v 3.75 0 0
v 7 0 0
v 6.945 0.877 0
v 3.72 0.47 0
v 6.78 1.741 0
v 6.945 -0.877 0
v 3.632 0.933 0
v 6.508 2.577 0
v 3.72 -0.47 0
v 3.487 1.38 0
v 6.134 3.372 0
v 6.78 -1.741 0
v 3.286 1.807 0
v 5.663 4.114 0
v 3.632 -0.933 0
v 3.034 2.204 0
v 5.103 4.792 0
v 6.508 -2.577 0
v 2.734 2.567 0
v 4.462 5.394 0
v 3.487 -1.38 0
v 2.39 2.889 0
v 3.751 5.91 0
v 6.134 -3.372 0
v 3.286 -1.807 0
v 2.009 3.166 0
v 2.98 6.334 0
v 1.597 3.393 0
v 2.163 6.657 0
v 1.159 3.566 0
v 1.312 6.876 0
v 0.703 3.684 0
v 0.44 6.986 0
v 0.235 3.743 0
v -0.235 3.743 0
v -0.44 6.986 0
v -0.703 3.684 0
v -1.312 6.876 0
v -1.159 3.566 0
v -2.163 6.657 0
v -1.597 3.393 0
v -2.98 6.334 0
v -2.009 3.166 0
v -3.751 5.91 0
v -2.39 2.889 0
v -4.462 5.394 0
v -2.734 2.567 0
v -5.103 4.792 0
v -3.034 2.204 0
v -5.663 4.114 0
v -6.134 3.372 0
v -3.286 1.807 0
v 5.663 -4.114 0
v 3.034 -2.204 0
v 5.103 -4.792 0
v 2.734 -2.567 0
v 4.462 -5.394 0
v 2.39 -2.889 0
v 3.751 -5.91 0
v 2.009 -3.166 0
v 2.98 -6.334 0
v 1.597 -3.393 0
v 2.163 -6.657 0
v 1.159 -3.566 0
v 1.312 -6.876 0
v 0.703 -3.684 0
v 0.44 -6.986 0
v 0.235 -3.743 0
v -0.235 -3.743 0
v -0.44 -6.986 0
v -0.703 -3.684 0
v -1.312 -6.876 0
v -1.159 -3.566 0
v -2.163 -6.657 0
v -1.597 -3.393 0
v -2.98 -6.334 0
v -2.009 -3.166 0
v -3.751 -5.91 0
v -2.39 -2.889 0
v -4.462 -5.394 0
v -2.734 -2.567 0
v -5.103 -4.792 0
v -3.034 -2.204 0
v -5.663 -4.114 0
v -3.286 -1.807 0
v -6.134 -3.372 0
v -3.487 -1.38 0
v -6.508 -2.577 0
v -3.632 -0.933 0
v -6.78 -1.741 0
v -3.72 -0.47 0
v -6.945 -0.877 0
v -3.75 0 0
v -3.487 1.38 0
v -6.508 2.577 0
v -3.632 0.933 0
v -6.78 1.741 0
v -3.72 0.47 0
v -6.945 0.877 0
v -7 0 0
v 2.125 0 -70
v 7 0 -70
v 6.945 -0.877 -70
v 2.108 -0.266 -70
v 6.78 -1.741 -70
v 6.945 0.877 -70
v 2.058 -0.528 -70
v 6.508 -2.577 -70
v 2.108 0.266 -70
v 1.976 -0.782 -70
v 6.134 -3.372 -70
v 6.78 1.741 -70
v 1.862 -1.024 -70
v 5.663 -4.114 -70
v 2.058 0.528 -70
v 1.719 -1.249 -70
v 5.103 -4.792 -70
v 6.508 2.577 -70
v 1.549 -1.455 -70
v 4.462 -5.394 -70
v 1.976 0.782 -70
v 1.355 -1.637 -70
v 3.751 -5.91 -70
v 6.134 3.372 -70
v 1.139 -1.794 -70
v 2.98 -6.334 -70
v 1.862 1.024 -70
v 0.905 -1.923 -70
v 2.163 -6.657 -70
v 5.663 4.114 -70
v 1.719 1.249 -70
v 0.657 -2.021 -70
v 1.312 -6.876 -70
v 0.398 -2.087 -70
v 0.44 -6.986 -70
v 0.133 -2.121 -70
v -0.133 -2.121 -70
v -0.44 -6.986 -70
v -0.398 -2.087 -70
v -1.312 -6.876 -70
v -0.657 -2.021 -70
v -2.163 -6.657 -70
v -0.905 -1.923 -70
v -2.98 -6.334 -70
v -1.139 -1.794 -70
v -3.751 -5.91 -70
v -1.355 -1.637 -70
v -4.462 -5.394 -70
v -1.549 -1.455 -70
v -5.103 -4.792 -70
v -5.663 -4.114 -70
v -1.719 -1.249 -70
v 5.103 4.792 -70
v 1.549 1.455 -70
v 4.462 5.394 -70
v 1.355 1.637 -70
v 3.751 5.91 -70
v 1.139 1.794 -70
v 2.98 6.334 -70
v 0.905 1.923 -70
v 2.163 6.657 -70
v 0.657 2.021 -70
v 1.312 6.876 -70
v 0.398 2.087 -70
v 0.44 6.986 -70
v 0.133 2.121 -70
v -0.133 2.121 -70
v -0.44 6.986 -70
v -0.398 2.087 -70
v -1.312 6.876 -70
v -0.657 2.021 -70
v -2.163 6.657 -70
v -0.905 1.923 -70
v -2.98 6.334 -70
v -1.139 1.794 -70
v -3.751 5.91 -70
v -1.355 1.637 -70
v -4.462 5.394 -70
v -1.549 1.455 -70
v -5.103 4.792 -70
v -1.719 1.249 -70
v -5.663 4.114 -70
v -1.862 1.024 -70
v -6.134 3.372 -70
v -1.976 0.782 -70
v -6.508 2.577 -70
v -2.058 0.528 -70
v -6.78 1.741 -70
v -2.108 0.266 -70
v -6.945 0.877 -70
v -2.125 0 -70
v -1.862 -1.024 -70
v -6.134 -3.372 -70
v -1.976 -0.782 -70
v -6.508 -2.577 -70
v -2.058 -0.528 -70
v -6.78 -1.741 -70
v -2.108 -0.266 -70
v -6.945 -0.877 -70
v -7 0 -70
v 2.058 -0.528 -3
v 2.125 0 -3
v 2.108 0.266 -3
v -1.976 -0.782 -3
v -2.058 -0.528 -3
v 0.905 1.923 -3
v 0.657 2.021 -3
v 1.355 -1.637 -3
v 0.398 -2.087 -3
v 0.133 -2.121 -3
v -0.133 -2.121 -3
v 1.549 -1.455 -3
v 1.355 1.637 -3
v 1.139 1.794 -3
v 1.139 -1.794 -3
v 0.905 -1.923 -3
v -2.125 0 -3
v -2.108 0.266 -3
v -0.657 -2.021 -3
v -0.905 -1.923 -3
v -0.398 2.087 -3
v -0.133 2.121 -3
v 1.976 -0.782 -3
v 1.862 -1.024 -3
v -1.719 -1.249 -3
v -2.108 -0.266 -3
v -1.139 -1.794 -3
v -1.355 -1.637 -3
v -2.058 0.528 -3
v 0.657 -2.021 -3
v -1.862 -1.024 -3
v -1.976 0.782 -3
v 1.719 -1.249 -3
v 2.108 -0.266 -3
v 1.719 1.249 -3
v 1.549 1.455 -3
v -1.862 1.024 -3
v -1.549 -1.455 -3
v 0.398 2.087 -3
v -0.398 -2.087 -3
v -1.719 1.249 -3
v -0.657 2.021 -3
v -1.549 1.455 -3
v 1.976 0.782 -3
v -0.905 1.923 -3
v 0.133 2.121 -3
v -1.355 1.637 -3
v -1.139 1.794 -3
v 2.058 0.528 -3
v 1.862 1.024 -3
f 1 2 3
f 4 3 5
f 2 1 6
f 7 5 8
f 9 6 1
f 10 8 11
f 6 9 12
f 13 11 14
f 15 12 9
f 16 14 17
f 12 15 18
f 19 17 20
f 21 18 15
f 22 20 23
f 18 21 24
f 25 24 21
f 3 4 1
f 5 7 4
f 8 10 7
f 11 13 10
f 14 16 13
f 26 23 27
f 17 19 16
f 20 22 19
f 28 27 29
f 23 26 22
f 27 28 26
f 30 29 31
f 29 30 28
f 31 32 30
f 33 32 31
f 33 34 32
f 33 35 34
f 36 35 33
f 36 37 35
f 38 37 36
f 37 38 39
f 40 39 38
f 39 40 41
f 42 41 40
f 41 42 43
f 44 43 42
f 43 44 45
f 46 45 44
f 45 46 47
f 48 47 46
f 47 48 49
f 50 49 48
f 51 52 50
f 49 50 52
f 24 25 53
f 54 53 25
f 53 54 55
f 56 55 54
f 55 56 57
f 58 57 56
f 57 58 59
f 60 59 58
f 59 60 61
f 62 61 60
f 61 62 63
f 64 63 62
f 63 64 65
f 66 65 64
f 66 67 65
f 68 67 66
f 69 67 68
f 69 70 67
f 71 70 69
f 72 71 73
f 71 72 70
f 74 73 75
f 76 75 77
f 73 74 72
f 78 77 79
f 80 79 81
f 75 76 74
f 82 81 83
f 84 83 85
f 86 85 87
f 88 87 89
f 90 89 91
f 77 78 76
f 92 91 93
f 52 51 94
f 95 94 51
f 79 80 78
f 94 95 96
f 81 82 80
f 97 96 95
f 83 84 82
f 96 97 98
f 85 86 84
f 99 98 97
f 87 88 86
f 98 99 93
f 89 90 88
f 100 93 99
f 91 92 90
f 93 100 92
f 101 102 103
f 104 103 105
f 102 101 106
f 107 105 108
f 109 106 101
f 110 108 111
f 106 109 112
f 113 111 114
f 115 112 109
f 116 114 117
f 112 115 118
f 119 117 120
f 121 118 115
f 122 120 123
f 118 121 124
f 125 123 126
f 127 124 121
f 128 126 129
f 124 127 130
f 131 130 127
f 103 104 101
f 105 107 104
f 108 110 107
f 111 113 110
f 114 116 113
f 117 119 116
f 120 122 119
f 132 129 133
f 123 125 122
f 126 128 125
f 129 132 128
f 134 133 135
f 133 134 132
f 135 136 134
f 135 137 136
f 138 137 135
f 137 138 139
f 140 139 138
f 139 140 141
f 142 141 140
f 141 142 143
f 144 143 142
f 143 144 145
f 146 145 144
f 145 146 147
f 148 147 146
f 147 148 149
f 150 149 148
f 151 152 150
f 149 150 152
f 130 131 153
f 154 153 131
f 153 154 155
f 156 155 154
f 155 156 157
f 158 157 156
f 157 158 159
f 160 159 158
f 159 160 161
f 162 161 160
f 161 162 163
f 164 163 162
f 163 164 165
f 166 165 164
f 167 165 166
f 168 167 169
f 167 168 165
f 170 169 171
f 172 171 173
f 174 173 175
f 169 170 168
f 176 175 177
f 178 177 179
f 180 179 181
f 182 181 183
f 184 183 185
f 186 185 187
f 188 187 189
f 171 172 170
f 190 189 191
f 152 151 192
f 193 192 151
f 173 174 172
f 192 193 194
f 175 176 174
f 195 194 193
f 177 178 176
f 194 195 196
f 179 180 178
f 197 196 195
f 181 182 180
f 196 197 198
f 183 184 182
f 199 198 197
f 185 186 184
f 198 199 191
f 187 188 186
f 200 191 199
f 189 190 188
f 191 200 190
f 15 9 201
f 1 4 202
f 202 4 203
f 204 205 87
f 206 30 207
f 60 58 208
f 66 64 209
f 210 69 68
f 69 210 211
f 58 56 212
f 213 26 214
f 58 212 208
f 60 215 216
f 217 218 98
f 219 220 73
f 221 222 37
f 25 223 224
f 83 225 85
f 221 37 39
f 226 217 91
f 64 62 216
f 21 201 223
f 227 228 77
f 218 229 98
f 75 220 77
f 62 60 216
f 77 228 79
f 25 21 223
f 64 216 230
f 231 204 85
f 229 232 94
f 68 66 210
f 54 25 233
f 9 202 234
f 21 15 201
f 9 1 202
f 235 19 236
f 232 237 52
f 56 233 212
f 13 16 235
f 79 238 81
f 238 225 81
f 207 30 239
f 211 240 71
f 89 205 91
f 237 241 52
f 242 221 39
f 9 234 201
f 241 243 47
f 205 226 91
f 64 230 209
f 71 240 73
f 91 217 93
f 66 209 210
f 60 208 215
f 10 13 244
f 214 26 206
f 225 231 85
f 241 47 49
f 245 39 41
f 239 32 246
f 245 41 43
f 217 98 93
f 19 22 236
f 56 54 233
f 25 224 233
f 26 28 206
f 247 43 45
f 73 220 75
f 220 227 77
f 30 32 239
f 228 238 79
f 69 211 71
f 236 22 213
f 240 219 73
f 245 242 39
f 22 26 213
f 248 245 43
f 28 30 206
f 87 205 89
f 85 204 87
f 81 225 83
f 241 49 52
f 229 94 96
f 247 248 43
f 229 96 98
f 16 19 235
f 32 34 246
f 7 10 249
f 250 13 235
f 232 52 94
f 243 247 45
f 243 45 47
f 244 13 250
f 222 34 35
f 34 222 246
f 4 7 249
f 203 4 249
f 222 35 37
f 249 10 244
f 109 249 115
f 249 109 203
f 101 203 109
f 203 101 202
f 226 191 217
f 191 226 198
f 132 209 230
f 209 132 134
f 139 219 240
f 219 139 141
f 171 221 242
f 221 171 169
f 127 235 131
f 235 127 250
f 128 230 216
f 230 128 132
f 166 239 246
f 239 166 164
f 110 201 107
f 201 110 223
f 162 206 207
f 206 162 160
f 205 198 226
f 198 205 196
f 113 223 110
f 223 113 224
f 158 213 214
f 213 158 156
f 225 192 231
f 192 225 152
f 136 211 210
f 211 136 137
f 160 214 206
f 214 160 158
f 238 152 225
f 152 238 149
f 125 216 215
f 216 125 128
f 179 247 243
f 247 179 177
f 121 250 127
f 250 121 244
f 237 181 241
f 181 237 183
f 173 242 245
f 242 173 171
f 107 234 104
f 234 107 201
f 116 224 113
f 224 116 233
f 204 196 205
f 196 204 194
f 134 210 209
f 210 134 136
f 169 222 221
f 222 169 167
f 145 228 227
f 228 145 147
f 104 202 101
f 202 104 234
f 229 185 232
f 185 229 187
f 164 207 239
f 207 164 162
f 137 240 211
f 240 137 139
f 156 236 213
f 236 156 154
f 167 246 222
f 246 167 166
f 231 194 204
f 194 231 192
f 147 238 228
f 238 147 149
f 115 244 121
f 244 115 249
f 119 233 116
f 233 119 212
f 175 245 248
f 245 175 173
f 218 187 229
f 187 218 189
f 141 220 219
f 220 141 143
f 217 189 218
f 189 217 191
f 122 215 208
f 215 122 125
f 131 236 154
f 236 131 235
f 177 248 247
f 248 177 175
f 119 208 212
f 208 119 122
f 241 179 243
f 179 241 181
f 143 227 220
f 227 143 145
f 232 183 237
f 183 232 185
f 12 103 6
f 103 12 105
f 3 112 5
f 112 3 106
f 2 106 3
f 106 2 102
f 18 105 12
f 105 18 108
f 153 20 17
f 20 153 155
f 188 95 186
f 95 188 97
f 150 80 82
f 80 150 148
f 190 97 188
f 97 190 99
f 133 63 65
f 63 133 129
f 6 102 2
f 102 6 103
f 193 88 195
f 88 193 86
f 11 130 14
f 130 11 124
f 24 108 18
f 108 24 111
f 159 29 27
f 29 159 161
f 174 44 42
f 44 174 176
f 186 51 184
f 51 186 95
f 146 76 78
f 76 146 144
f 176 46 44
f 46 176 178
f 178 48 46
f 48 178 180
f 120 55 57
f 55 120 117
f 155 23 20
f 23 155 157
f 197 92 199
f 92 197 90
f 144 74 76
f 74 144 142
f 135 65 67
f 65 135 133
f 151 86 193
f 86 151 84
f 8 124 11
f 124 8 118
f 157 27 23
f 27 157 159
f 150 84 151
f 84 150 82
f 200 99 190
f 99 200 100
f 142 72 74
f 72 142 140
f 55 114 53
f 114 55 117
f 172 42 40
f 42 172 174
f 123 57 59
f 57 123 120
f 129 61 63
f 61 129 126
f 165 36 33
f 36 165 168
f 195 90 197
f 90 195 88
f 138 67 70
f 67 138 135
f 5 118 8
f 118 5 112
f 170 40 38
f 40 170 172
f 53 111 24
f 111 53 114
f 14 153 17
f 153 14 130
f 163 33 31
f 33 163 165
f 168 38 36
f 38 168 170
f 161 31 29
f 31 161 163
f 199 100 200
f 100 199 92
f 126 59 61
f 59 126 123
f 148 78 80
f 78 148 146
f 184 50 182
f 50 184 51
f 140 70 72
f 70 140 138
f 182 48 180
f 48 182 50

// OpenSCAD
$fn = 50;


difference() {
	union() {
		translate(v = [0, 0, -70.0000000000]) {
			cylinder(h = 70, r = 7.0000000000);
		}
		cylinder(h = 0, r = 10.0000000000);
	}
	union() {
		translate(v = [0, 0, 0]) {
			rotate(a = [0, 0, 0]) {
				difference() {
					union() {
						#translate(v = [0, 0, -70.0000000000]) {
							cylinder(h = 70, r = 2.0000000000);
						}
						#translate(v = [0, 0, -3]) {
							cylinder(h = 3, r1 = 2.1250000000, r2 = 3.7500000000);
						}
						#translate(v = [0, 0, -70.0000000000]) {
							cylinder(h = 70, r = 2.1250000000);
						}
						#translate(v = [0, 0, -70.0000000000]) {
							cylinder(h = 70, r = 2.0000000000);
						}
					}
					union();
				}
			}
		}
	}
}
